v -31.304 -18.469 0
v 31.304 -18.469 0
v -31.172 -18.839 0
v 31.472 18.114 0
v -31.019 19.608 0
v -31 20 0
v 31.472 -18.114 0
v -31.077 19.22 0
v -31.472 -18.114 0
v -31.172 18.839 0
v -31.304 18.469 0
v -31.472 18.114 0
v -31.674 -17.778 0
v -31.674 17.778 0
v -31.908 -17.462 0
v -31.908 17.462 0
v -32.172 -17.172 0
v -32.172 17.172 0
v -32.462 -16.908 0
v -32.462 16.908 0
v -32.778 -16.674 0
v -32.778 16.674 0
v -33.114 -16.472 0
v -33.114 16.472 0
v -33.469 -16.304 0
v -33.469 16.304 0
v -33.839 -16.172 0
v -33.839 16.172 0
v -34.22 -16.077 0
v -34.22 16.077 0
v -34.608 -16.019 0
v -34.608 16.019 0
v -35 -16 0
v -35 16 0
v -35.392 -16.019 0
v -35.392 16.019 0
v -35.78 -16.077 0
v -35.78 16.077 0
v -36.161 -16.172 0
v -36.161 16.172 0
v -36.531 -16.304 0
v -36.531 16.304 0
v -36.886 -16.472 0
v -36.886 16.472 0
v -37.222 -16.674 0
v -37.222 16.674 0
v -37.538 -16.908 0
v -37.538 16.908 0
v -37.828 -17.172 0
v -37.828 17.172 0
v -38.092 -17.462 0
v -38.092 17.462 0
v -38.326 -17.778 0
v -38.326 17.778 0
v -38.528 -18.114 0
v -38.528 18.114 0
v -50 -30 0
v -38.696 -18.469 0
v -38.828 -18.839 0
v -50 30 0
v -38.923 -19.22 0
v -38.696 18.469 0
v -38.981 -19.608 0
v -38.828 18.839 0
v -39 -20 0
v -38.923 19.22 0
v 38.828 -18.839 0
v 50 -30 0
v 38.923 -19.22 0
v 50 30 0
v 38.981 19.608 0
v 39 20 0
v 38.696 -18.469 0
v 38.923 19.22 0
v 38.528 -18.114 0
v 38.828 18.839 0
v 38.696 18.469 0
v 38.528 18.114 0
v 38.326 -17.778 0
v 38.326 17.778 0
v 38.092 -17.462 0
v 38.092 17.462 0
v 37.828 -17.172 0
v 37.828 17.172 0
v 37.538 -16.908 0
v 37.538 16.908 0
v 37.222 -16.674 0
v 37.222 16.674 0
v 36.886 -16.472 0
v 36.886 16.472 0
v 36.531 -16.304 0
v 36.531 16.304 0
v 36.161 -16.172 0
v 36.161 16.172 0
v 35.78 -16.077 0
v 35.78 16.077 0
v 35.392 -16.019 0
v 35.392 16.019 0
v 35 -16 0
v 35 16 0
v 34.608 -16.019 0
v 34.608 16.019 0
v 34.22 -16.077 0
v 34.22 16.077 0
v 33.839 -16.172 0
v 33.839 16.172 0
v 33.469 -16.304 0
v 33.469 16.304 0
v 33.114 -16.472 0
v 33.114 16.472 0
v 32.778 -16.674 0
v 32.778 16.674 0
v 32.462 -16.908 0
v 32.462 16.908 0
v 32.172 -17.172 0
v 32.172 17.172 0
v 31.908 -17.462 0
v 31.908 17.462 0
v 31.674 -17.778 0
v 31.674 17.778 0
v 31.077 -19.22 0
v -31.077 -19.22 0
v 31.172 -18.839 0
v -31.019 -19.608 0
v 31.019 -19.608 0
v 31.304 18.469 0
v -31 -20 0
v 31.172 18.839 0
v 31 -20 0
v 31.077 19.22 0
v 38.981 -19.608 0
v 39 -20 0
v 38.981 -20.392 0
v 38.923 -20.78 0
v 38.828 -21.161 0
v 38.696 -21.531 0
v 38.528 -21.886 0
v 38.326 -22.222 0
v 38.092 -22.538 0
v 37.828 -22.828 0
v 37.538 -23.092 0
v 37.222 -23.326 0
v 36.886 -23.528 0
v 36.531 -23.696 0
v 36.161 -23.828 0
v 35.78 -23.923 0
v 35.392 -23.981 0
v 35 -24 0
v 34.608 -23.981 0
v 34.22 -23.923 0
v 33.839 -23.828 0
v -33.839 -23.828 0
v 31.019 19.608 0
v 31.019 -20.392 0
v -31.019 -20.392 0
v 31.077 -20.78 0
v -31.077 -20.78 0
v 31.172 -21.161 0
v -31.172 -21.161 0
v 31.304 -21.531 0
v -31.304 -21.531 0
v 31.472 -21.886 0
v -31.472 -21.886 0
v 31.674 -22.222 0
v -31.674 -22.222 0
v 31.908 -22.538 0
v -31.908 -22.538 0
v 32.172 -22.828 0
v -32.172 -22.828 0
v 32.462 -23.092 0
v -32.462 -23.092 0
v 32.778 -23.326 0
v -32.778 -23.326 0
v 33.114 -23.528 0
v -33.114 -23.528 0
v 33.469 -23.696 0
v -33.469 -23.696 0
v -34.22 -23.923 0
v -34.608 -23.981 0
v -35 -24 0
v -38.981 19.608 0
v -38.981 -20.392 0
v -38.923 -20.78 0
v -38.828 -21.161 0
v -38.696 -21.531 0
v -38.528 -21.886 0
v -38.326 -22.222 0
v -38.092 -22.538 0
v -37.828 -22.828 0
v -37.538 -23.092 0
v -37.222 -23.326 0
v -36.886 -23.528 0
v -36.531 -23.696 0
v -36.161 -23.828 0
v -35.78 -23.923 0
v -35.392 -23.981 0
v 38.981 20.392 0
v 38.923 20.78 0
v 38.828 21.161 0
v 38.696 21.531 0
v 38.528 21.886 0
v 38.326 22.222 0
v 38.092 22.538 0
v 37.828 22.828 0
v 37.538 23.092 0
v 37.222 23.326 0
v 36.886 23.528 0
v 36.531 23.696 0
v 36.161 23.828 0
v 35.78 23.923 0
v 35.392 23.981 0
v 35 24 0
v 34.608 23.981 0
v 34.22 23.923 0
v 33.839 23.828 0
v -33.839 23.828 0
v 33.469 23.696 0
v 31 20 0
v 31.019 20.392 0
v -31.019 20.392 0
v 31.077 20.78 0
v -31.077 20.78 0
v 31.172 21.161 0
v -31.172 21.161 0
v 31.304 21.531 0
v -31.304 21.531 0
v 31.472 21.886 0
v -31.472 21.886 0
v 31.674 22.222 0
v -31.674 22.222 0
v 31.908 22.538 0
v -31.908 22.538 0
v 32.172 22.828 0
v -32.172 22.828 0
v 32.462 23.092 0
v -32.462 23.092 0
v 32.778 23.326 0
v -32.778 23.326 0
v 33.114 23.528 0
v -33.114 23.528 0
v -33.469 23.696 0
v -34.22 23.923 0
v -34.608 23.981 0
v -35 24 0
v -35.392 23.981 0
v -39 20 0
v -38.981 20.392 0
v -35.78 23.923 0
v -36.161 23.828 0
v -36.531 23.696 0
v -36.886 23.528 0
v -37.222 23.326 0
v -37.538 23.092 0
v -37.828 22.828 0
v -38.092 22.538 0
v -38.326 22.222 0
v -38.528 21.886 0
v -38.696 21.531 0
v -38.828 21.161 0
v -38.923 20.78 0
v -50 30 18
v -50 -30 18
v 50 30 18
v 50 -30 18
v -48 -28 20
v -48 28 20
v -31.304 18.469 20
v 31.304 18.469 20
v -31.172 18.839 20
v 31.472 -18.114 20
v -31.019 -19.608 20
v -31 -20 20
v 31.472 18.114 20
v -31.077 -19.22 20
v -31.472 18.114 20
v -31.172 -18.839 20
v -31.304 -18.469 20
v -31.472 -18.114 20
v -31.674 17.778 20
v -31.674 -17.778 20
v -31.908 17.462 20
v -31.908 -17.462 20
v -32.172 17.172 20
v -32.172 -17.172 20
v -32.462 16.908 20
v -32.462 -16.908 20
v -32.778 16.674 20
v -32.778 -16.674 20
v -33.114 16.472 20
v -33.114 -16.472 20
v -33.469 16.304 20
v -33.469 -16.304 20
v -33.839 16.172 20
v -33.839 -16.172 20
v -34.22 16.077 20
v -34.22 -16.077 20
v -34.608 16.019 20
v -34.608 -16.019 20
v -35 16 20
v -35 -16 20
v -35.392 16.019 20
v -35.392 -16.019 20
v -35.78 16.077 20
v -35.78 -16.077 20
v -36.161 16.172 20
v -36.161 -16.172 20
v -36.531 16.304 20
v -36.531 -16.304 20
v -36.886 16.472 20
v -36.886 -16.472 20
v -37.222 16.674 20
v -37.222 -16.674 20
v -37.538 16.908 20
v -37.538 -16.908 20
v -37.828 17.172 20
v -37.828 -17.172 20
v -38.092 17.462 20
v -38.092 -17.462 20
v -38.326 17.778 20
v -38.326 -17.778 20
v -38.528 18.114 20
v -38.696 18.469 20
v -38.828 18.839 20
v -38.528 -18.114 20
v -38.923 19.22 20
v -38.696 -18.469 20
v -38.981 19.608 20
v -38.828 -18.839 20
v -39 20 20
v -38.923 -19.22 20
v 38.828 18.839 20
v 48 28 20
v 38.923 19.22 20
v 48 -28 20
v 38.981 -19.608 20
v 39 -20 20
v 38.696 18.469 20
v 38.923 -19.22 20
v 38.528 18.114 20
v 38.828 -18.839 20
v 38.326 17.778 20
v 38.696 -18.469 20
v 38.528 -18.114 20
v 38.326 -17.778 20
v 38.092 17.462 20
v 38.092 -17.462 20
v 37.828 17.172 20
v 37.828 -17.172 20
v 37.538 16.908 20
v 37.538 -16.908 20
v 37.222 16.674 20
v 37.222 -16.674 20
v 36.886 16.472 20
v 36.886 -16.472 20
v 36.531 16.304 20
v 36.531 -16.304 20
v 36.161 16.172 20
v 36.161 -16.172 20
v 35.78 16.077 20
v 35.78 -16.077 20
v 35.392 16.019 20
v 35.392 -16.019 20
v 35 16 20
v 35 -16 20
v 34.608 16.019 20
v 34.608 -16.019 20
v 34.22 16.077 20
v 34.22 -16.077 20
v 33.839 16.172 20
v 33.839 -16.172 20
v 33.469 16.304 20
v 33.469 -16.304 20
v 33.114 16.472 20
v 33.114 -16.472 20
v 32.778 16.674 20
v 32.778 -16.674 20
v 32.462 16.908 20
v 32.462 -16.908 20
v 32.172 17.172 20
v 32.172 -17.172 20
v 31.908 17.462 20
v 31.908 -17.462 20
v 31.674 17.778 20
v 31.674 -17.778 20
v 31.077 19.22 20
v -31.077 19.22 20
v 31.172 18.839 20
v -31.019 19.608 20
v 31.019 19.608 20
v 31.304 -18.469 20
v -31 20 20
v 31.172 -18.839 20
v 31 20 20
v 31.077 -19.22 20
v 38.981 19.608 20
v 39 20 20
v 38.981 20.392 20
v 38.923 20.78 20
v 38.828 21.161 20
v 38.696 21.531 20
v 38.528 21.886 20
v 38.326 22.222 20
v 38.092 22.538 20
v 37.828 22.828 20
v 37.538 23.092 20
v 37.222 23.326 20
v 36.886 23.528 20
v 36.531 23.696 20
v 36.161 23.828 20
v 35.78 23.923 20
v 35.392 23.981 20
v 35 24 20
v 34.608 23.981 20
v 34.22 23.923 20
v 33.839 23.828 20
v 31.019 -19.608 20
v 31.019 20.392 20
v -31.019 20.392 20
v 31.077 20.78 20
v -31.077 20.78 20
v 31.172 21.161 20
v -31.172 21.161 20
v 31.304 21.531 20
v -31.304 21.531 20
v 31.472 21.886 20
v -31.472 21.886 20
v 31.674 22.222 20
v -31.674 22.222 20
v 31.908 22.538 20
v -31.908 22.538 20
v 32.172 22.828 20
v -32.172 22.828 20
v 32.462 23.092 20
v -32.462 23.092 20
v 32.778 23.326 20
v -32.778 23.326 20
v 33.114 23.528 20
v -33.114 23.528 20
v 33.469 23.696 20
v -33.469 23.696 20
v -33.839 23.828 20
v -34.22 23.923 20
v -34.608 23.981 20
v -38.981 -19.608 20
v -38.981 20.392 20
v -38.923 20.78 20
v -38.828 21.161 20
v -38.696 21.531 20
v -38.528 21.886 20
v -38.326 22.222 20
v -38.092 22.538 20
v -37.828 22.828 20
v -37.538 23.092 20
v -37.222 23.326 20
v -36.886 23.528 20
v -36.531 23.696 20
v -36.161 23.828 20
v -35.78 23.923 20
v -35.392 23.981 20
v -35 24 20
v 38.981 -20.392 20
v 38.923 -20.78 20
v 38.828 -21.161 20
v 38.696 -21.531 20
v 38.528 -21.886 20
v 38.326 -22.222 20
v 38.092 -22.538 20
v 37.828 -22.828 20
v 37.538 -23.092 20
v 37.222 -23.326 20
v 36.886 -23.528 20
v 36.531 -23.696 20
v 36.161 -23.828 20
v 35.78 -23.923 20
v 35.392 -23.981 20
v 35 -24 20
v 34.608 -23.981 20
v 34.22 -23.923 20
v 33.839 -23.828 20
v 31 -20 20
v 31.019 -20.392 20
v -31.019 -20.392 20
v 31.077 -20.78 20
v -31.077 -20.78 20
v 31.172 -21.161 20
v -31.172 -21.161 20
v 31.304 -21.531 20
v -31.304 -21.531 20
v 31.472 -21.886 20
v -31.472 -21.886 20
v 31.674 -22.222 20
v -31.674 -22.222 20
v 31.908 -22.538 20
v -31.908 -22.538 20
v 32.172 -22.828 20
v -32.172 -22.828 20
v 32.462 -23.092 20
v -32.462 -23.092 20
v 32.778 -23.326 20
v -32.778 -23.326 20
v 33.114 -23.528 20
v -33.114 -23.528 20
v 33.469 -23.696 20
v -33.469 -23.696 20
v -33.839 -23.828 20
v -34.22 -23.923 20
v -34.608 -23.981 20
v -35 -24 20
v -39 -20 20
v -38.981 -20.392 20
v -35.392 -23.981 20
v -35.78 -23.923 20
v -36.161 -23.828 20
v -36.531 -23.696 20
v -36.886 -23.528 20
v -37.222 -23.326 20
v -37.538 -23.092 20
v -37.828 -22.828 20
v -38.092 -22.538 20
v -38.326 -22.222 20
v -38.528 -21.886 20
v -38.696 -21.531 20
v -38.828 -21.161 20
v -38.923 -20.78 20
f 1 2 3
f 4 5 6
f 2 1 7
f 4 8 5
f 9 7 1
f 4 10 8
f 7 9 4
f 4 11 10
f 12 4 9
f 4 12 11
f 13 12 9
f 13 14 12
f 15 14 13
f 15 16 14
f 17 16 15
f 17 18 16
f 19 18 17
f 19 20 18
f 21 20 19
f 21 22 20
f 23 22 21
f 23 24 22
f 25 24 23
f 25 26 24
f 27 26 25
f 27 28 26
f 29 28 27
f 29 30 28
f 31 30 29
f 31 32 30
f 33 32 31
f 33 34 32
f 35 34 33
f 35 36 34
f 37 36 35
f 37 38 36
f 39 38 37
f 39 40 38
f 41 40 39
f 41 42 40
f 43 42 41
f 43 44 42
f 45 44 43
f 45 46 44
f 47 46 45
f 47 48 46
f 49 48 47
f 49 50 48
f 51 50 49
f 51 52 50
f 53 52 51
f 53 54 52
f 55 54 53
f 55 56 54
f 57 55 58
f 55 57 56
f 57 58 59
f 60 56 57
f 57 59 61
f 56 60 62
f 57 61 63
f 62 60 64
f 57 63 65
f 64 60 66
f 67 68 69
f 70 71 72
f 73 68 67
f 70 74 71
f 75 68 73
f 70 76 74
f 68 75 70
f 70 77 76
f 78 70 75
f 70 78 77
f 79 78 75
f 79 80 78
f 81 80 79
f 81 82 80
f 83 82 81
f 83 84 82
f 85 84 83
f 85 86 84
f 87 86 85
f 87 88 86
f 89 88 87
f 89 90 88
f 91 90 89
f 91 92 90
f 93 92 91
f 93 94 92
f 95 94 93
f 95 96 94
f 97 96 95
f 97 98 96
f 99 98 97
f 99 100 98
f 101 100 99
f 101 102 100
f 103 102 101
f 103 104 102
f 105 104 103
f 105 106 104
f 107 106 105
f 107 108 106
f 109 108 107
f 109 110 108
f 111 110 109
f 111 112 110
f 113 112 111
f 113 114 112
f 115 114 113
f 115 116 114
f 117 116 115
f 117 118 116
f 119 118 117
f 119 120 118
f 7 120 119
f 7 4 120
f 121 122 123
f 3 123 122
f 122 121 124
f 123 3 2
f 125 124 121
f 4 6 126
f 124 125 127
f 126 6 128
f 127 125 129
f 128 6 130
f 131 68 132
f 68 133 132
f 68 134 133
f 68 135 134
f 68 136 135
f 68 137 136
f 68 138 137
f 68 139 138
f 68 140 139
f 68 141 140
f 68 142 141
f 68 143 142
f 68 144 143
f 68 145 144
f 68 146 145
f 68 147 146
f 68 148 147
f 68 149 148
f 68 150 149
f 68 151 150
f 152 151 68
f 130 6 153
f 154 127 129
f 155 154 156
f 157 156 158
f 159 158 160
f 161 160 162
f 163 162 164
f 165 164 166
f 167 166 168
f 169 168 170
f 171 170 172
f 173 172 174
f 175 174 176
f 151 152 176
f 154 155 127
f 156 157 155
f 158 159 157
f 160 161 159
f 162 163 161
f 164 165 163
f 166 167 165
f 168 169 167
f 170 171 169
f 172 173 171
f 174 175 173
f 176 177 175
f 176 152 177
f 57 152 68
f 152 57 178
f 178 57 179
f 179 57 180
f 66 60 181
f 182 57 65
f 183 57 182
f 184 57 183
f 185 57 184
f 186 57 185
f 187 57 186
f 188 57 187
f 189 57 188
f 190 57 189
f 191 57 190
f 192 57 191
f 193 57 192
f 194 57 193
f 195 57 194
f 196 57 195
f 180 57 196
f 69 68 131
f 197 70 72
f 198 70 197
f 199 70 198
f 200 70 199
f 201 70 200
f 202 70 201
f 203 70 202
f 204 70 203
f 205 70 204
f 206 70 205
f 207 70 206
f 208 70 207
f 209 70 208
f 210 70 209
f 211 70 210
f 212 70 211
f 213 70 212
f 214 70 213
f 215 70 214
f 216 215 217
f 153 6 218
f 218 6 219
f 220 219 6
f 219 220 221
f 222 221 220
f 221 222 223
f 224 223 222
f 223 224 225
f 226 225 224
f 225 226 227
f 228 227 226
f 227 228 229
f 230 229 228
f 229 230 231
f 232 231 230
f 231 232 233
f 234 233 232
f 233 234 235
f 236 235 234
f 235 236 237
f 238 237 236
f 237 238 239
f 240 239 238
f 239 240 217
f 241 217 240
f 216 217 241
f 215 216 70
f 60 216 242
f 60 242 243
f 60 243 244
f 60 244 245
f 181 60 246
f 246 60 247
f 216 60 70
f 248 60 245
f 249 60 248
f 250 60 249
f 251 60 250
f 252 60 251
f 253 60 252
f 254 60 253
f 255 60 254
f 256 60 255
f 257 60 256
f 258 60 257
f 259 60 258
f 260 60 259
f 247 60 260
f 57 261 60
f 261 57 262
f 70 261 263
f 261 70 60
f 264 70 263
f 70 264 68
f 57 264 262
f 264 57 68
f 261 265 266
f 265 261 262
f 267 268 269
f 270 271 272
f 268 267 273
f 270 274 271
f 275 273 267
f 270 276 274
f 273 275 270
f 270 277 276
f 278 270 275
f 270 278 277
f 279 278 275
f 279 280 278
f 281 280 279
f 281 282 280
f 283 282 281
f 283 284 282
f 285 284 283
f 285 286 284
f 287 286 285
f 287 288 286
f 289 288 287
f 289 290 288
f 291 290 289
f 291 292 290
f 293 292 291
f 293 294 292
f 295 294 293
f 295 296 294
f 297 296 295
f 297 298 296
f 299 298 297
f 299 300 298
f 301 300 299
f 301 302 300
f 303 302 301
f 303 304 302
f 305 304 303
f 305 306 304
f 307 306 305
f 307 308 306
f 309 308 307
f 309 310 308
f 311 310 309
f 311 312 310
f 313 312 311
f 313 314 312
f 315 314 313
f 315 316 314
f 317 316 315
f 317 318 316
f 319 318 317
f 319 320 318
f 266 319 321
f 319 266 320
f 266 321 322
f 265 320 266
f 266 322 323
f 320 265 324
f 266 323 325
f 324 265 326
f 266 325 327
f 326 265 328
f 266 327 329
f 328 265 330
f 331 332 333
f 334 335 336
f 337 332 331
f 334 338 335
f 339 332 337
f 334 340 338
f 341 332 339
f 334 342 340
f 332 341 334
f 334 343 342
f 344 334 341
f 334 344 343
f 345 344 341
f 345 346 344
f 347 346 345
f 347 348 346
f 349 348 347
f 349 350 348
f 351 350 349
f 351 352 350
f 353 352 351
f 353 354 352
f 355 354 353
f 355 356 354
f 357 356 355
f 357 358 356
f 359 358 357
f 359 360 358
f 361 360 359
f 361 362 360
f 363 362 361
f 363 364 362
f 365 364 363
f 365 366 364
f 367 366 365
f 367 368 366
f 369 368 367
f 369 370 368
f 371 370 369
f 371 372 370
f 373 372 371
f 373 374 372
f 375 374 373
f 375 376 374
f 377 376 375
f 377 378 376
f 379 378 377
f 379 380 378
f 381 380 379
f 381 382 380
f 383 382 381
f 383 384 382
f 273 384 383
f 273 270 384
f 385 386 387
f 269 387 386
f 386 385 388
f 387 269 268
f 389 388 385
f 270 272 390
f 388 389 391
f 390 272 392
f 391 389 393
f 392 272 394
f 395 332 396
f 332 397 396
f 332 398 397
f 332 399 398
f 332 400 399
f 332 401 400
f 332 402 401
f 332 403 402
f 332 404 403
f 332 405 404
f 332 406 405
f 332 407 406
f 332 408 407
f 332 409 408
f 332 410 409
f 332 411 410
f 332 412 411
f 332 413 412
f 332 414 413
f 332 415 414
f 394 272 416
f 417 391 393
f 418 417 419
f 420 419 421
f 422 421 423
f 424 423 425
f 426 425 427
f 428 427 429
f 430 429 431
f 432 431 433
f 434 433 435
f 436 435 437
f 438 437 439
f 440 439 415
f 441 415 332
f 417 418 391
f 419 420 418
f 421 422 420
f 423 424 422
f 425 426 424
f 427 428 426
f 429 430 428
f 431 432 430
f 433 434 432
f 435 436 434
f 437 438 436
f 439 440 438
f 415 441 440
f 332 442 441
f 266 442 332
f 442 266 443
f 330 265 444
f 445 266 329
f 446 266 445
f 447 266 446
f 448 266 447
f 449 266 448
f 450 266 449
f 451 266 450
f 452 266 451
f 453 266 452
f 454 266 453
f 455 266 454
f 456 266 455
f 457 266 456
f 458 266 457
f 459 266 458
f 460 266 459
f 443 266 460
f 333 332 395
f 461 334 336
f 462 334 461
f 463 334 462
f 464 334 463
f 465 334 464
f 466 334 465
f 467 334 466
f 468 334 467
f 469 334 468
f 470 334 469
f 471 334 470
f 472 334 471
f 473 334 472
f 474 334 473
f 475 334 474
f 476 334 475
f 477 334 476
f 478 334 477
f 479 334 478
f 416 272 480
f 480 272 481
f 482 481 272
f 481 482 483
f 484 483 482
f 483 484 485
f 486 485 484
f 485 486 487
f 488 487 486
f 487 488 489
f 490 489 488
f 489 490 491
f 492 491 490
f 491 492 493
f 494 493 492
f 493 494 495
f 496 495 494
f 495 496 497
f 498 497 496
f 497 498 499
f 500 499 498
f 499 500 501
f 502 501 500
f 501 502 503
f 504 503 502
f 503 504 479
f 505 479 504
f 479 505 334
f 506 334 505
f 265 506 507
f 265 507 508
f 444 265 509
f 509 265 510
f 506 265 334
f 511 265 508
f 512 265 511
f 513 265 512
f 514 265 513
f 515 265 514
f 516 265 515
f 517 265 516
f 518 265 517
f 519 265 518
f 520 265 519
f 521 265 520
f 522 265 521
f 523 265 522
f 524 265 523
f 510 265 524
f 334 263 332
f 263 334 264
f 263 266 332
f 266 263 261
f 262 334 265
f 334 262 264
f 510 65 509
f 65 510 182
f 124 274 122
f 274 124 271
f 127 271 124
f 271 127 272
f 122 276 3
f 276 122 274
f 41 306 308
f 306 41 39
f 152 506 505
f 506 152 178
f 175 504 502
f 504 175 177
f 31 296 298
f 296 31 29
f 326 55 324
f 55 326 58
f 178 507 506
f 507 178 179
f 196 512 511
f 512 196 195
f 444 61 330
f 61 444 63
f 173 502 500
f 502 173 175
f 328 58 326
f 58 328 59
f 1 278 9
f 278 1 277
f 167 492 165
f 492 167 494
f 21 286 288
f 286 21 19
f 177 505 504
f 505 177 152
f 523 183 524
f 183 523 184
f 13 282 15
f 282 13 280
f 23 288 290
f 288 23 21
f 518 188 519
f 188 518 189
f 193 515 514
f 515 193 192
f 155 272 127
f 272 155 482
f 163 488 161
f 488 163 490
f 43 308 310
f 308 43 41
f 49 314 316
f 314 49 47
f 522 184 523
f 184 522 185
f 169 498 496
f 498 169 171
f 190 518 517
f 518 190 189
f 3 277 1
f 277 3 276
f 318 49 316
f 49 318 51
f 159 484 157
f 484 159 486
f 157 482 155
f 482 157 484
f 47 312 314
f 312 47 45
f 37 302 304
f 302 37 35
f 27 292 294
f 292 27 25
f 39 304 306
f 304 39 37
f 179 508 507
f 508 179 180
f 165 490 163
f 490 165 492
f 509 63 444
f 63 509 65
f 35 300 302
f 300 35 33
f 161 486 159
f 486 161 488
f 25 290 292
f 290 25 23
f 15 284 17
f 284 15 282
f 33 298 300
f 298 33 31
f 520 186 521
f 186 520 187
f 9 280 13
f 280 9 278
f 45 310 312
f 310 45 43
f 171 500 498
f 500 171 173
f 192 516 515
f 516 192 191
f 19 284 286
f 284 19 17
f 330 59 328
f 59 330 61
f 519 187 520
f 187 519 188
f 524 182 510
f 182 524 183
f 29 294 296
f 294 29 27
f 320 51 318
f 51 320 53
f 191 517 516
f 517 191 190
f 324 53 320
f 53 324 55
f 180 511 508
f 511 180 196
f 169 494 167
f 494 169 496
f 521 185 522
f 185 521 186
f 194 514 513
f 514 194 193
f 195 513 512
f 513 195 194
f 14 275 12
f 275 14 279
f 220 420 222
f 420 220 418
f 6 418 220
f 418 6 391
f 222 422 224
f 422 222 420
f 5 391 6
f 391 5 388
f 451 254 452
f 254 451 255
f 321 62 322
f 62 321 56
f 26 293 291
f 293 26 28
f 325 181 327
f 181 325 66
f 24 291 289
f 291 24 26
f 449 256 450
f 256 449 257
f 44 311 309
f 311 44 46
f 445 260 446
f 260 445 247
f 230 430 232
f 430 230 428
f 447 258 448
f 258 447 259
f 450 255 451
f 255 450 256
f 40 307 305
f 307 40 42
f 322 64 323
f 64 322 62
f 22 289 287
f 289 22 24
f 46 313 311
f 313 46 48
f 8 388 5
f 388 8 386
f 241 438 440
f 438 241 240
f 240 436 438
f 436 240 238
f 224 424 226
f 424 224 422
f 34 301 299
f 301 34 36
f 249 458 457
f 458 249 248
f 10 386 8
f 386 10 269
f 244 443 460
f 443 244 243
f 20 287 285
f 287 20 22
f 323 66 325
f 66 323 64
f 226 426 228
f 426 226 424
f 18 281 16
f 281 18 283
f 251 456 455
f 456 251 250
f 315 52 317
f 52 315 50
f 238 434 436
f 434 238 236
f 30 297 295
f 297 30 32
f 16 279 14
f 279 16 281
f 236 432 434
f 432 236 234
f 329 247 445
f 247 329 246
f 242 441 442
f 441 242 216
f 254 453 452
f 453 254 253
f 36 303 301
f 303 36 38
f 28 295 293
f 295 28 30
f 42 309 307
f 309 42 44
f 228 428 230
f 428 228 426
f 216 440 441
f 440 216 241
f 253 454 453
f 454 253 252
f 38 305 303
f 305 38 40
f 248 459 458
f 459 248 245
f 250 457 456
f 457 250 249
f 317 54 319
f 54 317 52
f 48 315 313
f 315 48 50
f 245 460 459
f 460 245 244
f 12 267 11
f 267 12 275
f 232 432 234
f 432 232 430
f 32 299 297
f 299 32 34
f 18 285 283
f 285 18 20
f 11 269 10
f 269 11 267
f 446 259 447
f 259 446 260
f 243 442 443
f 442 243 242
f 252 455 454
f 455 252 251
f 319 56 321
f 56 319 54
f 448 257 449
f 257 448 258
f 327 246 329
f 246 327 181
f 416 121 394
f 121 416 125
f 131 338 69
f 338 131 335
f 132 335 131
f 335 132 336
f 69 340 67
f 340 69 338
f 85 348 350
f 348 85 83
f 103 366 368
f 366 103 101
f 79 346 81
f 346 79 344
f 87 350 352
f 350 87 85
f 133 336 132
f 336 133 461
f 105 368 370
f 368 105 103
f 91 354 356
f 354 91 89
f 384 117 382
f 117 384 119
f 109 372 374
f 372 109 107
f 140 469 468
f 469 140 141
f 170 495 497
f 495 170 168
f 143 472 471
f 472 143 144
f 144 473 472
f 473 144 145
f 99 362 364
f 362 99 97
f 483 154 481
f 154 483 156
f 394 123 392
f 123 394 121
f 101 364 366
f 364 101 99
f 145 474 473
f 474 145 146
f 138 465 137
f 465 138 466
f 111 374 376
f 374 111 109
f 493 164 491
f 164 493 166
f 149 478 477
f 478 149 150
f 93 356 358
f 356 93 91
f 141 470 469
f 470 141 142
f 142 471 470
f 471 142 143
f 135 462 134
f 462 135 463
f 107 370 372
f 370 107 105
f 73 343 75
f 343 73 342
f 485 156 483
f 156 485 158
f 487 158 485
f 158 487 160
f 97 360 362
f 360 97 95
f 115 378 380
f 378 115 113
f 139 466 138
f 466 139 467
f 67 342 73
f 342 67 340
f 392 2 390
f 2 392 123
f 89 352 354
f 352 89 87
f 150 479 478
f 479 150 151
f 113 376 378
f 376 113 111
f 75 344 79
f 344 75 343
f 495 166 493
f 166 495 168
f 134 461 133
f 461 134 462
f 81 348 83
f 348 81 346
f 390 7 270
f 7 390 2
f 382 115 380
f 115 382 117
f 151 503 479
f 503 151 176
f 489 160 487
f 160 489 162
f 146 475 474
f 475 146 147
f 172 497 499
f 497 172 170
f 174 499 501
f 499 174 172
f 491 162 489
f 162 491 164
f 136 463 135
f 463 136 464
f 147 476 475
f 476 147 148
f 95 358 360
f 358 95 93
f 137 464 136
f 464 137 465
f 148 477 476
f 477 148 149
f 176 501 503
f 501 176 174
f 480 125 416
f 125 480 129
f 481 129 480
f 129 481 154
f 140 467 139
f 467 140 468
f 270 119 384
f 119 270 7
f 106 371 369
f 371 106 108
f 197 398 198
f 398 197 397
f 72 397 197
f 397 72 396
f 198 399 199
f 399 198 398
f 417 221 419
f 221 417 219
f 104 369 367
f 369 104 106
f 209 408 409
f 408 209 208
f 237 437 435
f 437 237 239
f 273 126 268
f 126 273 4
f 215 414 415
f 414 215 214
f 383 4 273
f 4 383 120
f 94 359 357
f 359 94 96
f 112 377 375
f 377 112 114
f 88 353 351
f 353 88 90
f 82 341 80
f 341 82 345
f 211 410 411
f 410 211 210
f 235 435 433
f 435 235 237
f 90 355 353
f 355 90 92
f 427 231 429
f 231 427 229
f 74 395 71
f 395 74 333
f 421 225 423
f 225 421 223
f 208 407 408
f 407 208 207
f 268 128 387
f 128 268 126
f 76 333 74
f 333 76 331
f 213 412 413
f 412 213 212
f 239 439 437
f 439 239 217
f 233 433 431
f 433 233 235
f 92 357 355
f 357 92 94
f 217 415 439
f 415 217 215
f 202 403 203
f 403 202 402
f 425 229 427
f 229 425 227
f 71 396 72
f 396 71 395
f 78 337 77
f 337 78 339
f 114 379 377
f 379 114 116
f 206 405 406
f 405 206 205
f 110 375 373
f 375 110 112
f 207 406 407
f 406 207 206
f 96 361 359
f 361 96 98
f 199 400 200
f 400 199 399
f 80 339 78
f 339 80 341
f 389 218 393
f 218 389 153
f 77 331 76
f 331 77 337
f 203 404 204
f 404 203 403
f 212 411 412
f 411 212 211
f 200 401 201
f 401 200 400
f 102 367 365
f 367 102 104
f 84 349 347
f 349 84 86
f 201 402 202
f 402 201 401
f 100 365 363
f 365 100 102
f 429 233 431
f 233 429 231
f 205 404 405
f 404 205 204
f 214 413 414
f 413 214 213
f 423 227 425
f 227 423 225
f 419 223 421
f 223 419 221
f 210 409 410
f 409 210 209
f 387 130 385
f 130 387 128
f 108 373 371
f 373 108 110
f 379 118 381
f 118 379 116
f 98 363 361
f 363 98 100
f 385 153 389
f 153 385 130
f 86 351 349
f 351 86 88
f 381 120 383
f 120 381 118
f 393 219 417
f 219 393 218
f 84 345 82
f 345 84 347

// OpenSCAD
// Rectangular Block with Top Perimeter Chamfer and Holes
// All dimensions in millimeters

// Block Dimensions
length = 100;       // X-axis length
width = 60;         // Y-axis width
height = 20;        // Z-axis height
chamfer = 2;        // Top outer perimeter chamfer size

// Hole Parameters
hole_diameter = 8;  // Through-hole diameter
hole_radius = hole_diameter / 2;
hole_x_offset = 35; // Hole center distance from origin in X
hole_y_offset = 20; // Hole center distance from origin in Y

// Smoothness
$fn = 64;

module main_block() {
    // Base rectangular section (Z = 0 to height - chamfer)
    translate([0, 0, 0])
        linear_extrude(height = height - chamfer)
            square([length, width], center = true);
    
    // Top chamfered section (Z = height - chamfer to height)
    translate([0, 0, height - chamfer])
        linear_extrude(
            height = chamfer,
            scale = [
                (length - 2 * chamfer) / length,
                (width - 2 * chamfer) / width
            ]
        )
            square([length, width], center = true);
}

module hole_cutouts() {
    // Four vertical through-holes
    for (x = [-hole_x_offset, hole_x_offset]) {
        for (y = [-hole_y_offset, hole_y_offset]) {
            translate([x, y, -1])
                cylinder(r = hole_radius, h = height + 2);
        }
    }
}

// Final Assembly
difference() {
    main_block();
    hole_cutouts();
}
